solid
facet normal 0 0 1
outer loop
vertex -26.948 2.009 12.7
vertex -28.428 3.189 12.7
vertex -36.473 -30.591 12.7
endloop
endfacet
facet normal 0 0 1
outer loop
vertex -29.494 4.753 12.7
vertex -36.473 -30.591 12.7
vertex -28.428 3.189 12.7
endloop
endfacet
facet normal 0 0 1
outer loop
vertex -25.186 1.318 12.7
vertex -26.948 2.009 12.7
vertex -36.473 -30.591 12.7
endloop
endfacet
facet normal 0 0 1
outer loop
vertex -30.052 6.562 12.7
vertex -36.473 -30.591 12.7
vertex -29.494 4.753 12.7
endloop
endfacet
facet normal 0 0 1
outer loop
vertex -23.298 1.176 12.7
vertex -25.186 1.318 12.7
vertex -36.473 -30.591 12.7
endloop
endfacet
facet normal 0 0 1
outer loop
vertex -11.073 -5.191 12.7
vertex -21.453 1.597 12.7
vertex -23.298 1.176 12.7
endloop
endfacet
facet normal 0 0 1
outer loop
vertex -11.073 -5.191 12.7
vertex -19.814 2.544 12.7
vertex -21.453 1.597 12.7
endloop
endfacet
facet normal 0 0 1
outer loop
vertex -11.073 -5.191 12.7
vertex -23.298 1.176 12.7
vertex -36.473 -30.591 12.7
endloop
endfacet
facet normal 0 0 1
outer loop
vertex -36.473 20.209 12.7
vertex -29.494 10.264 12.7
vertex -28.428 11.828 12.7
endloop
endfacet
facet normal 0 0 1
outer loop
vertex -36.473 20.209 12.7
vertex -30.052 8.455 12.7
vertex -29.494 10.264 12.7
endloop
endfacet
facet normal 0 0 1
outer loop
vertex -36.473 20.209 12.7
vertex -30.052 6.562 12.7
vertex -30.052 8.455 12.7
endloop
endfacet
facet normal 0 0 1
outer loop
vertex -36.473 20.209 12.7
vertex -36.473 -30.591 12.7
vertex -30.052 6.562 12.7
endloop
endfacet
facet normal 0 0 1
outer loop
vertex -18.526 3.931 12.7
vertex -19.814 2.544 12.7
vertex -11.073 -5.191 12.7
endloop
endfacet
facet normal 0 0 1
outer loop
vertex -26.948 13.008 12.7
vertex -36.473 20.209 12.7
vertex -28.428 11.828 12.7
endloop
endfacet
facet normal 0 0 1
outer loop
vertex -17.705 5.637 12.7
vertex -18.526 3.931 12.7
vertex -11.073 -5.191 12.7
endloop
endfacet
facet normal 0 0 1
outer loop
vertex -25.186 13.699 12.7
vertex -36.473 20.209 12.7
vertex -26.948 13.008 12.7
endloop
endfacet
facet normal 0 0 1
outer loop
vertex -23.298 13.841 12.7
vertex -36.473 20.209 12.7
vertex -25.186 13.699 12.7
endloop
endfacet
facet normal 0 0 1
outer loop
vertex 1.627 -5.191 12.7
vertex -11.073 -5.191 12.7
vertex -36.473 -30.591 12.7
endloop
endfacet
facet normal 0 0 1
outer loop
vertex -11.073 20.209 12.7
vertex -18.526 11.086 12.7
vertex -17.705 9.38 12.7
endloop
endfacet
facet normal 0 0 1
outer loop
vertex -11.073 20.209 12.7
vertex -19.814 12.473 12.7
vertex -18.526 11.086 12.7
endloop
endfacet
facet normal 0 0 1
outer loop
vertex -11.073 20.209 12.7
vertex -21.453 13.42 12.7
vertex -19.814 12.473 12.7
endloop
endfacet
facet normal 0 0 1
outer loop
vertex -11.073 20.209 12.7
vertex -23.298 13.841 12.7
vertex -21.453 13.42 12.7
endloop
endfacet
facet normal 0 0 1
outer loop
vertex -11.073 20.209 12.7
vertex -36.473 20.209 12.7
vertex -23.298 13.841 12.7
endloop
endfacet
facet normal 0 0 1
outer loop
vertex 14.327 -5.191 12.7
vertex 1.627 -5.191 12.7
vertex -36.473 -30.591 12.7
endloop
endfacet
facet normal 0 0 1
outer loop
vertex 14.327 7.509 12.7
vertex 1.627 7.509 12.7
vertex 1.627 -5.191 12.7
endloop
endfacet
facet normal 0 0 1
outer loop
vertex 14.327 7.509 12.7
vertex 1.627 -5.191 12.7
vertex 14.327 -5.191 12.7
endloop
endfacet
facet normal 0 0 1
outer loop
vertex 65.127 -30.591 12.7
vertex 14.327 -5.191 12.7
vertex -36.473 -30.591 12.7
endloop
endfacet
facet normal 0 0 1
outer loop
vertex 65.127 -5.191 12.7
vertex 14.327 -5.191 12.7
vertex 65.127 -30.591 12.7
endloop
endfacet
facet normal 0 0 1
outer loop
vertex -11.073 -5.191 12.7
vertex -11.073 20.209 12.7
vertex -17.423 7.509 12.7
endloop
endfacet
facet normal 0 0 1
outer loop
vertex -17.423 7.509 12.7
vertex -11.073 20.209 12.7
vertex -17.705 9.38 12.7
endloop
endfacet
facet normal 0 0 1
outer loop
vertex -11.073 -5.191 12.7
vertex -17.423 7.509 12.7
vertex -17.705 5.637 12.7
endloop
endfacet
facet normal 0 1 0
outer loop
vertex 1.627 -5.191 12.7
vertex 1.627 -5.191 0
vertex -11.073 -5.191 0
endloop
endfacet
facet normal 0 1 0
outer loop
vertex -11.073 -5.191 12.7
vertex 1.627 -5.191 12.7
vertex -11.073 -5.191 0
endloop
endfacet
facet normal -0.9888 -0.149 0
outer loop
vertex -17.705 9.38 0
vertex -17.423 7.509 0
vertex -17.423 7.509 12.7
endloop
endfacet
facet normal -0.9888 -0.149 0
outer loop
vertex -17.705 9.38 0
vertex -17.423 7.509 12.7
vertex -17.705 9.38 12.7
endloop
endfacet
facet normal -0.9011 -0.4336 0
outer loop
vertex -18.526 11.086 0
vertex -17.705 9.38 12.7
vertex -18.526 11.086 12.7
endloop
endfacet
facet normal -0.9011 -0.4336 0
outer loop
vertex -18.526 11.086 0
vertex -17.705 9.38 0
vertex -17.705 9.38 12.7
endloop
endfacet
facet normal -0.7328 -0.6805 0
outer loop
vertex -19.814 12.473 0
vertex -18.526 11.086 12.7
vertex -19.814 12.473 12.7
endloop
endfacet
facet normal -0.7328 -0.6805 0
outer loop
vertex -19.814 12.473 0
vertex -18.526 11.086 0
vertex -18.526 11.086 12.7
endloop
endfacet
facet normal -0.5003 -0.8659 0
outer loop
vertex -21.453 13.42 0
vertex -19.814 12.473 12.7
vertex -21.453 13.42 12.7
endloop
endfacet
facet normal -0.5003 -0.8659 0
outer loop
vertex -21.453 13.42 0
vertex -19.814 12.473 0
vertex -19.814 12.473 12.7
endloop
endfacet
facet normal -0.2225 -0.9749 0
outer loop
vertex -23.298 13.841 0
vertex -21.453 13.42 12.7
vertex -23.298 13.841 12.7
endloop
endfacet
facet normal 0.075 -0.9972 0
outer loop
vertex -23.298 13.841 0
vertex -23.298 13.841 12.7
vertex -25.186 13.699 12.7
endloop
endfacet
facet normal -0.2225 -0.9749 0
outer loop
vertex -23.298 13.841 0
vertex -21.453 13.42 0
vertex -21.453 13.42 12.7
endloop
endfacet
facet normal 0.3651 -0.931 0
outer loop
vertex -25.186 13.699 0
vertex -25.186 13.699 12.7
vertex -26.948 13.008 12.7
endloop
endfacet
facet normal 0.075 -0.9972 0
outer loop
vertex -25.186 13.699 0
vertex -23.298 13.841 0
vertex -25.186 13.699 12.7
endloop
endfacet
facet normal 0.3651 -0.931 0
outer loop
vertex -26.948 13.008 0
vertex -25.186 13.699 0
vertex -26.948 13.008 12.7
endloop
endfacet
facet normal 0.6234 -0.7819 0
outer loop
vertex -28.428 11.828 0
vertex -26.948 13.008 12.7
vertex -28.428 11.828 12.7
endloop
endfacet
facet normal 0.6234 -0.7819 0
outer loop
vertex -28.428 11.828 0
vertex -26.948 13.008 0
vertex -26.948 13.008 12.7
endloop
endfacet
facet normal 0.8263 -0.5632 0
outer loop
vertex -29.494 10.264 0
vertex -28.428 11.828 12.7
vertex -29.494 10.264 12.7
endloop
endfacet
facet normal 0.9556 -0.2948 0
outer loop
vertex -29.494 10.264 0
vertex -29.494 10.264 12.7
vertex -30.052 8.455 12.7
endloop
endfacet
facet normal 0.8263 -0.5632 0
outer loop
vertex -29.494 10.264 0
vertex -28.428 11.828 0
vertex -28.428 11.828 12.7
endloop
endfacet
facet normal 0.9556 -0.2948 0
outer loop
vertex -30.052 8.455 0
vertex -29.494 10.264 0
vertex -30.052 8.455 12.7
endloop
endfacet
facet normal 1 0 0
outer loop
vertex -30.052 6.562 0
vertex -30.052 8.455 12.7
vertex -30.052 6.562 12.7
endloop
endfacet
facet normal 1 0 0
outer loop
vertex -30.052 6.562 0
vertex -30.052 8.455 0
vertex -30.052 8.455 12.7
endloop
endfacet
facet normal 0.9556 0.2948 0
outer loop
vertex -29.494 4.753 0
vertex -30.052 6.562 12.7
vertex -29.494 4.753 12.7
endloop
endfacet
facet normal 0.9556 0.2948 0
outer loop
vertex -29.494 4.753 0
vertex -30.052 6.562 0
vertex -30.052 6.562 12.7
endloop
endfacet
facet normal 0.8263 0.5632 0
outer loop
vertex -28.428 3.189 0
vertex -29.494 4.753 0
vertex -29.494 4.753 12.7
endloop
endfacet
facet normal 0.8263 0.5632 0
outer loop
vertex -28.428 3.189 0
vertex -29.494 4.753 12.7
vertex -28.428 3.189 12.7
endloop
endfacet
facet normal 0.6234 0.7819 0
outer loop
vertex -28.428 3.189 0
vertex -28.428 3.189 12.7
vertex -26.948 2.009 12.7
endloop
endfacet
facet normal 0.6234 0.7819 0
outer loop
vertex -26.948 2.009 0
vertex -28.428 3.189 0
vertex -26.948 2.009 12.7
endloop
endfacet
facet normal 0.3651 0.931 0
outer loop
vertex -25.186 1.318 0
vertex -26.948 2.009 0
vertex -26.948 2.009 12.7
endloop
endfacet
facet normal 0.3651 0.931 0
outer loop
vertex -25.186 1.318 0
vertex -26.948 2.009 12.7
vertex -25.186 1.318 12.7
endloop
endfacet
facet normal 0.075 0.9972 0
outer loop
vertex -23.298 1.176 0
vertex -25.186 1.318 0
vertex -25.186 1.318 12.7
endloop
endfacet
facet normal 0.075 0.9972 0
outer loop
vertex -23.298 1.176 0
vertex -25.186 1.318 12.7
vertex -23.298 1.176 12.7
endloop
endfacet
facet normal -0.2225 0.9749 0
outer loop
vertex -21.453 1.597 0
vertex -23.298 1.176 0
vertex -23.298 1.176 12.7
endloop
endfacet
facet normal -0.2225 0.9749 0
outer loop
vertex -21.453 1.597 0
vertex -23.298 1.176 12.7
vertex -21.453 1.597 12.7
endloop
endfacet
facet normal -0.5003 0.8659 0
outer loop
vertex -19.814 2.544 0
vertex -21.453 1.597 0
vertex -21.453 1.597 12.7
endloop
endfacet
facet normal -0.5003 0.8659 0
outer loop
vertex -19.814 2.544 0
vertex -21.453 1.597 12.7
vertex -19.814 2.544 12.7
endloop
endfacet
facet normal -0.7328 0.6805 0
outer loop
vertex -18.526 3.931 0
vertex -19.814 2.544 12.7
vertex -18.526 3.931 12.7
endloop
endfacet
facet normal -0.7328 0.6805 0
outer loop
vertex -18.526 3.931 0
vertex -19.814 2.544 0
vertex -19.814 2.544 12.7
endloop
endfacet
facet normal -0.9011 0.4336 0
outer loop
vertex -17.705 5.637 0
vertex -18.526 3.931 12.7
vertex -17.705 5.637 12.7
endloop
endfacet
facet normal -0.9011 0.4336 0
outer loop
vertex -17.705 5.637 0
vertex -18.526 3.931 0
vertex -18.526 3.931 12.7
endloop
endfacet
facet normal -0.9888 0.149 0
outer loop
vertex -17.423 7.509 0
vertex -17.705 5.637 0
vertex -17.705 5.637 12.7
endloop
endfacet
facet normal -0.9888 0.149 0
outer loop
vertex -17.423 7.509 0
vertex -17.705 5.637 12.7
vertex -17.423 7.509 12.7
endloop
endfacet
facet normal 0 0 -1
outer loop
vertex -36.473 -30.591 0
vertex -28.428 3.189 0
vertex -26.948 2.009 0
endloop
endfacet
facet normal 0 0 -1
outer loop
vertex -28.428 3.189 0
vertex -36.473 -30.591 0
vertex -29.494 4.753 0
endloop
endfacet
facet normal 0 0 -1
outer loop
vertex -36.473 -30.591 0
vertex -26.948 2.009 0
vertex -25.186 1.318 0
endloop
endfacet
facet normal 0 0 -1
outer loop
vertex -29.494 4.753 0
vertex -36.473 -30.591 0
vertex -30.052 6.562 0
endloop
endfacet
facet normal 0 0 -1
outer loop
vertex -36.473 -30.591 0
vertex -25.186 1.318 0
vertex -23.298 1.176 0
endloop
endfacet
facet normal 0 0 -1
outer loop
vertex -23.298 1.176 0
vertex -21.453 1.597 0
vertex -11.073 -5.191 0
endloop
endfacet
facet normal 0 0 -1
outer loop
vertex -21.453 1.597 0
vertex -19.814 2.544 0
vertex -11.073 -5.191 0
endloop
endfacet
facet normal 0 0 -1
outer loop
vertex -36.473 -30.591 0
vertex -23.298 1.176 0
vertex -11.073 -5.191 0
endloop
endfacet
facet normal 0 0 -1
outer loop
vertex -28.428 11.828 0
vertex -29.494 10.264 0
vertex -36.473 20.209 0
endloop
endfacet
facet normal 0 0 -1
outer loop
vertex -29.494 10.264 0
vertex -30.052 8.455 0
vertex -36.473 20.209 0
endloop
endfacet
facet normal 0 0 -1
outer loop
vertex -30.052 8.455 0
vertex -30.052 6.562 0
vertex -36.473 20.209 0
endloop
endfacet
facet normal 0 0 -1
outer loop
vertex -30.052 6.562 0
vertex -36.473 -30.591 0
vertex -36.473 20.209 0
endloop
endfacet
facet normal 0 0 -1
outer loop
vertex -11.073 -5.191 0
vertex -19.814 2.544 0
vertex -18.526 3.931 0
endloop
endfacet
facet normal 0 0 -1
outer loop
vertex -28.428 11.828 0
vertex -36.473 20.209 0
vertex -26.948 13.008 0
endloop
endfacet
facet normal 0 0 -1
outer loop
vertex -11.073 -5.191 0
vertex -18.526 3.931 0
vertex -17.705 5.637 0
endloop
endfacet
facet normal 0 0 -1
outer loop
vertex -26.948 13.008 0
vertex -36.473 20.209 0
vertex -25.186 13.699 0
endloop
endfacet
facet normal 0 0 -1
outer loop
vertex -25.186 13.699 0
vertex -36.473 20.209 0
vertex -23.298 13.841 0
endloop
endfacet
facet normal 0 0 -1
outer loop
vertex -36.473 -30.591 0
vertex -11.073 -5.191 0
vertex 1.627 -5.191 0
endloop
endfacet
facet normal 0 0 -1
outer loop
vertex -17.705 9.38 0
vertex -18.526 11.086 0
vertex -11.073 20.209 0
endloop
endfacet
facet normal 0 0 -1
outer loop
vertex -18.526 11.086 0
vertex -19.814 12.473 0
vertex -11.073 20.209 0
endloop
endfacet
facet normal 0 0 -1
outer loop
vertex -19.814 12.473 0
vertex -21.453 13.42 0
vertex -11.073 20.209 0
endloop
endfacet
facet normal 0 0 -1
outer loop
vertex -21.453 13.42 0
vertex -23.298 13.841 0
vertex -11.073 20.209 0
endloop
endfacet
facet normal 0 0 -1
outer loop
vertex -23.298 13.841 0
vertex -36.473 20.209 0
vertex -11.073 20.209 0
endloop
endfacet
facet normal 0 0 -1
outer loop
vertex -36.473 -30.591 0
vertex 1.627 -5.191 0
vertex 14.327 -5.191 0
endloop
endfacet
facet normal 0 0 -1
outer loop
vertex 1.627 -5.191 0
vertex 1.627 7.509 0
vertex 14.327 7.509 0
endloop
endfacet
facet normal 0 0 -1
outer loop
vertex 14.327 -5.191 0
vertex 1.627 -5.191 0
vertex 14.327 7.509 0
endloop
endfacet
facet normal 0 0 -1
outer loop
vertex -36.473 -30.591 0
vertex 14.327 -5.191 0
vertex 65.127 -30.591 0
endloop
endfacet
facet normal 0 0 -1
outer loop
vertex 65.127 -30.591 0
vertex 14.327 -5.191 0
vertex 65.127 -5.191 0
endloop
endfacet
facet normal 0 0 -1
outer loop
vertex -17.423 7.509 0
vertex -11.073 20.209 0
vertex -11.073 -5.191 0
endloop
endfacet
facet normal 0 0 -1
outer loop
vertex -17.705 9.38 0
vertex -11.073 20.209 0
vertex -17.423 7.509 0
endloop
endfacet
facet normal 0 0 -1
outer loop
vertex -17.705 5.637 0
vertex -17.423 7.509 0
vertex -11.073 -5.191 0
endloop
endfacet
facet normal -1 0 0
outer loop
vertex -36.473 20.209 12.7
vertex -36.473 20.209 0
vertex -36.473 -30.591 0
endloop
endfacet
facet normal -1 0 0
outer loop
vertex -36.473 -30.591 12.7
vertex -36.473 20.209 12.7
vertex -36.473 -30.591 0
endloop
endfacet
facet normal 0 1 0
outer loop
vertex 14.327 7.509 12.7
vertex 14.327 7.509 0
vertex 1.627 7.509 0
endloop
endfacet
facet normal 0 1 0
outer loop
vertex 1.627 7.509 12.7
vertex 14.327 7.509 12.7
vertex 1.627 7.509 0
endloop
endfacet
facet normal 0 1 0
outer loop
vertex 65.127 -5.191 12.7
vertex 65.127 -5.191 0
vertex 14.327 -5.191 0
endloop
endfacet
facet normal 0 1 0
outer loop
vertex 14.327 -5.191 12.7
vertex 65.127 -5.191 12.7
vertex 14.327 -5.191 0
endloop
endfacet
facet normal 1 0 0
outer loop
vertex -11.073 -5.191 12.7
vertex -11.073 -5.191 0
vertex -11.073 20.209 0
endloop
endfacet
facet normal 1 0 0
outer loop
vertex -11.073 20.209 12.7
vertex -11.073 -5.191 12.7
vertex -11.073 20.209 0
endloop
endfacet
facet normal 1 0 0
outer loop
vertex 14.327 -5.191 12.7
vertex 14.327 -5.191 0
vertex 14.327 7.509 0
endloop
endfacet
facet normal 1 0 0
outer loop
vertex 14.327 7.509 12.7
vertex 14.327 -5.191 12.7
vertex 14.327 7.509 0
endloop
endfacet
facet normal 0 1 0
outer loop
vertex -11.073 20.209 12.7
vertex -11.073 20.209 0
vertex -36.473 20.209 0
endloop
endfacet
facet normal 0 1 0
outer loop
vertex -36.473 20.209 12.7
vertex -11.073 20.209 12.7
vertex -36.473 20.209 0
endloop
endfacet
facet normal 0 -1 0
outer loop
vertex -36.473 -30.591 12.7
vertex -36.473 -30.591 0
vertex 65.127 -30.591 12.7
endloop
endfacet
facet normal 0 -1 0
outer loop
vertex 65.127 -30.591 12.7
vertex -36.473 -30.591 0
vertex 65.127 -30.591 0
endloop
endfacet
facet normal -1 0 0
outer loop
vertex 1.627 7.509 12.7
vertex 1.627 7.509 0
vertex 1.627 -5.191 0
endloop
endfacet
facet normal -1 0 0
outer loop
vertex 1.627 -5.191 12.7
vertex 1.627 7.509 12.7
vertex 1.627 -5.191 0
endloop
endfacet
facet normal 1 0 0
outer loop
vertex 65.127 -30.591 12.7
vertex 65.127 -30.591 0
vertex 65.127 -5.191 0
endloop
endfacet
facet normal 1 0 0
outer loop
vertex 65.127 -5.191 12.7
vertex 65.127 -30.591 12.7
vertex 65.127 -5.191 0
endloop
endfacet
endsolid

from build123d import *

# Parameters (mm, degrees)
F0_R     = 6.35
F1_DEPTH = 12.7


with BuildPart() as f1:
    # F0 (on Top) → F1 (new body)
    with BuildSketch(Plane.XY):
        Polygon((-11.073005, 20.208511), (-36.473005, 20.208511), (-36.473005, -30.591489), (65.126995, -30.591489), (65.126995, -5.191489), (14.326995, -5.191489), (14.326995, 7.508511), (1.626995, 7.508511), (1.626995, -5.191489), (-11.073005, -5.191489), align=None)
        with Locations((-23.773005, 7.508511)):
            Circle(F0_R, mode=Mode.SUBTRACT)
    extrude(amount=F1_DEPTH)


solid = f1.part
